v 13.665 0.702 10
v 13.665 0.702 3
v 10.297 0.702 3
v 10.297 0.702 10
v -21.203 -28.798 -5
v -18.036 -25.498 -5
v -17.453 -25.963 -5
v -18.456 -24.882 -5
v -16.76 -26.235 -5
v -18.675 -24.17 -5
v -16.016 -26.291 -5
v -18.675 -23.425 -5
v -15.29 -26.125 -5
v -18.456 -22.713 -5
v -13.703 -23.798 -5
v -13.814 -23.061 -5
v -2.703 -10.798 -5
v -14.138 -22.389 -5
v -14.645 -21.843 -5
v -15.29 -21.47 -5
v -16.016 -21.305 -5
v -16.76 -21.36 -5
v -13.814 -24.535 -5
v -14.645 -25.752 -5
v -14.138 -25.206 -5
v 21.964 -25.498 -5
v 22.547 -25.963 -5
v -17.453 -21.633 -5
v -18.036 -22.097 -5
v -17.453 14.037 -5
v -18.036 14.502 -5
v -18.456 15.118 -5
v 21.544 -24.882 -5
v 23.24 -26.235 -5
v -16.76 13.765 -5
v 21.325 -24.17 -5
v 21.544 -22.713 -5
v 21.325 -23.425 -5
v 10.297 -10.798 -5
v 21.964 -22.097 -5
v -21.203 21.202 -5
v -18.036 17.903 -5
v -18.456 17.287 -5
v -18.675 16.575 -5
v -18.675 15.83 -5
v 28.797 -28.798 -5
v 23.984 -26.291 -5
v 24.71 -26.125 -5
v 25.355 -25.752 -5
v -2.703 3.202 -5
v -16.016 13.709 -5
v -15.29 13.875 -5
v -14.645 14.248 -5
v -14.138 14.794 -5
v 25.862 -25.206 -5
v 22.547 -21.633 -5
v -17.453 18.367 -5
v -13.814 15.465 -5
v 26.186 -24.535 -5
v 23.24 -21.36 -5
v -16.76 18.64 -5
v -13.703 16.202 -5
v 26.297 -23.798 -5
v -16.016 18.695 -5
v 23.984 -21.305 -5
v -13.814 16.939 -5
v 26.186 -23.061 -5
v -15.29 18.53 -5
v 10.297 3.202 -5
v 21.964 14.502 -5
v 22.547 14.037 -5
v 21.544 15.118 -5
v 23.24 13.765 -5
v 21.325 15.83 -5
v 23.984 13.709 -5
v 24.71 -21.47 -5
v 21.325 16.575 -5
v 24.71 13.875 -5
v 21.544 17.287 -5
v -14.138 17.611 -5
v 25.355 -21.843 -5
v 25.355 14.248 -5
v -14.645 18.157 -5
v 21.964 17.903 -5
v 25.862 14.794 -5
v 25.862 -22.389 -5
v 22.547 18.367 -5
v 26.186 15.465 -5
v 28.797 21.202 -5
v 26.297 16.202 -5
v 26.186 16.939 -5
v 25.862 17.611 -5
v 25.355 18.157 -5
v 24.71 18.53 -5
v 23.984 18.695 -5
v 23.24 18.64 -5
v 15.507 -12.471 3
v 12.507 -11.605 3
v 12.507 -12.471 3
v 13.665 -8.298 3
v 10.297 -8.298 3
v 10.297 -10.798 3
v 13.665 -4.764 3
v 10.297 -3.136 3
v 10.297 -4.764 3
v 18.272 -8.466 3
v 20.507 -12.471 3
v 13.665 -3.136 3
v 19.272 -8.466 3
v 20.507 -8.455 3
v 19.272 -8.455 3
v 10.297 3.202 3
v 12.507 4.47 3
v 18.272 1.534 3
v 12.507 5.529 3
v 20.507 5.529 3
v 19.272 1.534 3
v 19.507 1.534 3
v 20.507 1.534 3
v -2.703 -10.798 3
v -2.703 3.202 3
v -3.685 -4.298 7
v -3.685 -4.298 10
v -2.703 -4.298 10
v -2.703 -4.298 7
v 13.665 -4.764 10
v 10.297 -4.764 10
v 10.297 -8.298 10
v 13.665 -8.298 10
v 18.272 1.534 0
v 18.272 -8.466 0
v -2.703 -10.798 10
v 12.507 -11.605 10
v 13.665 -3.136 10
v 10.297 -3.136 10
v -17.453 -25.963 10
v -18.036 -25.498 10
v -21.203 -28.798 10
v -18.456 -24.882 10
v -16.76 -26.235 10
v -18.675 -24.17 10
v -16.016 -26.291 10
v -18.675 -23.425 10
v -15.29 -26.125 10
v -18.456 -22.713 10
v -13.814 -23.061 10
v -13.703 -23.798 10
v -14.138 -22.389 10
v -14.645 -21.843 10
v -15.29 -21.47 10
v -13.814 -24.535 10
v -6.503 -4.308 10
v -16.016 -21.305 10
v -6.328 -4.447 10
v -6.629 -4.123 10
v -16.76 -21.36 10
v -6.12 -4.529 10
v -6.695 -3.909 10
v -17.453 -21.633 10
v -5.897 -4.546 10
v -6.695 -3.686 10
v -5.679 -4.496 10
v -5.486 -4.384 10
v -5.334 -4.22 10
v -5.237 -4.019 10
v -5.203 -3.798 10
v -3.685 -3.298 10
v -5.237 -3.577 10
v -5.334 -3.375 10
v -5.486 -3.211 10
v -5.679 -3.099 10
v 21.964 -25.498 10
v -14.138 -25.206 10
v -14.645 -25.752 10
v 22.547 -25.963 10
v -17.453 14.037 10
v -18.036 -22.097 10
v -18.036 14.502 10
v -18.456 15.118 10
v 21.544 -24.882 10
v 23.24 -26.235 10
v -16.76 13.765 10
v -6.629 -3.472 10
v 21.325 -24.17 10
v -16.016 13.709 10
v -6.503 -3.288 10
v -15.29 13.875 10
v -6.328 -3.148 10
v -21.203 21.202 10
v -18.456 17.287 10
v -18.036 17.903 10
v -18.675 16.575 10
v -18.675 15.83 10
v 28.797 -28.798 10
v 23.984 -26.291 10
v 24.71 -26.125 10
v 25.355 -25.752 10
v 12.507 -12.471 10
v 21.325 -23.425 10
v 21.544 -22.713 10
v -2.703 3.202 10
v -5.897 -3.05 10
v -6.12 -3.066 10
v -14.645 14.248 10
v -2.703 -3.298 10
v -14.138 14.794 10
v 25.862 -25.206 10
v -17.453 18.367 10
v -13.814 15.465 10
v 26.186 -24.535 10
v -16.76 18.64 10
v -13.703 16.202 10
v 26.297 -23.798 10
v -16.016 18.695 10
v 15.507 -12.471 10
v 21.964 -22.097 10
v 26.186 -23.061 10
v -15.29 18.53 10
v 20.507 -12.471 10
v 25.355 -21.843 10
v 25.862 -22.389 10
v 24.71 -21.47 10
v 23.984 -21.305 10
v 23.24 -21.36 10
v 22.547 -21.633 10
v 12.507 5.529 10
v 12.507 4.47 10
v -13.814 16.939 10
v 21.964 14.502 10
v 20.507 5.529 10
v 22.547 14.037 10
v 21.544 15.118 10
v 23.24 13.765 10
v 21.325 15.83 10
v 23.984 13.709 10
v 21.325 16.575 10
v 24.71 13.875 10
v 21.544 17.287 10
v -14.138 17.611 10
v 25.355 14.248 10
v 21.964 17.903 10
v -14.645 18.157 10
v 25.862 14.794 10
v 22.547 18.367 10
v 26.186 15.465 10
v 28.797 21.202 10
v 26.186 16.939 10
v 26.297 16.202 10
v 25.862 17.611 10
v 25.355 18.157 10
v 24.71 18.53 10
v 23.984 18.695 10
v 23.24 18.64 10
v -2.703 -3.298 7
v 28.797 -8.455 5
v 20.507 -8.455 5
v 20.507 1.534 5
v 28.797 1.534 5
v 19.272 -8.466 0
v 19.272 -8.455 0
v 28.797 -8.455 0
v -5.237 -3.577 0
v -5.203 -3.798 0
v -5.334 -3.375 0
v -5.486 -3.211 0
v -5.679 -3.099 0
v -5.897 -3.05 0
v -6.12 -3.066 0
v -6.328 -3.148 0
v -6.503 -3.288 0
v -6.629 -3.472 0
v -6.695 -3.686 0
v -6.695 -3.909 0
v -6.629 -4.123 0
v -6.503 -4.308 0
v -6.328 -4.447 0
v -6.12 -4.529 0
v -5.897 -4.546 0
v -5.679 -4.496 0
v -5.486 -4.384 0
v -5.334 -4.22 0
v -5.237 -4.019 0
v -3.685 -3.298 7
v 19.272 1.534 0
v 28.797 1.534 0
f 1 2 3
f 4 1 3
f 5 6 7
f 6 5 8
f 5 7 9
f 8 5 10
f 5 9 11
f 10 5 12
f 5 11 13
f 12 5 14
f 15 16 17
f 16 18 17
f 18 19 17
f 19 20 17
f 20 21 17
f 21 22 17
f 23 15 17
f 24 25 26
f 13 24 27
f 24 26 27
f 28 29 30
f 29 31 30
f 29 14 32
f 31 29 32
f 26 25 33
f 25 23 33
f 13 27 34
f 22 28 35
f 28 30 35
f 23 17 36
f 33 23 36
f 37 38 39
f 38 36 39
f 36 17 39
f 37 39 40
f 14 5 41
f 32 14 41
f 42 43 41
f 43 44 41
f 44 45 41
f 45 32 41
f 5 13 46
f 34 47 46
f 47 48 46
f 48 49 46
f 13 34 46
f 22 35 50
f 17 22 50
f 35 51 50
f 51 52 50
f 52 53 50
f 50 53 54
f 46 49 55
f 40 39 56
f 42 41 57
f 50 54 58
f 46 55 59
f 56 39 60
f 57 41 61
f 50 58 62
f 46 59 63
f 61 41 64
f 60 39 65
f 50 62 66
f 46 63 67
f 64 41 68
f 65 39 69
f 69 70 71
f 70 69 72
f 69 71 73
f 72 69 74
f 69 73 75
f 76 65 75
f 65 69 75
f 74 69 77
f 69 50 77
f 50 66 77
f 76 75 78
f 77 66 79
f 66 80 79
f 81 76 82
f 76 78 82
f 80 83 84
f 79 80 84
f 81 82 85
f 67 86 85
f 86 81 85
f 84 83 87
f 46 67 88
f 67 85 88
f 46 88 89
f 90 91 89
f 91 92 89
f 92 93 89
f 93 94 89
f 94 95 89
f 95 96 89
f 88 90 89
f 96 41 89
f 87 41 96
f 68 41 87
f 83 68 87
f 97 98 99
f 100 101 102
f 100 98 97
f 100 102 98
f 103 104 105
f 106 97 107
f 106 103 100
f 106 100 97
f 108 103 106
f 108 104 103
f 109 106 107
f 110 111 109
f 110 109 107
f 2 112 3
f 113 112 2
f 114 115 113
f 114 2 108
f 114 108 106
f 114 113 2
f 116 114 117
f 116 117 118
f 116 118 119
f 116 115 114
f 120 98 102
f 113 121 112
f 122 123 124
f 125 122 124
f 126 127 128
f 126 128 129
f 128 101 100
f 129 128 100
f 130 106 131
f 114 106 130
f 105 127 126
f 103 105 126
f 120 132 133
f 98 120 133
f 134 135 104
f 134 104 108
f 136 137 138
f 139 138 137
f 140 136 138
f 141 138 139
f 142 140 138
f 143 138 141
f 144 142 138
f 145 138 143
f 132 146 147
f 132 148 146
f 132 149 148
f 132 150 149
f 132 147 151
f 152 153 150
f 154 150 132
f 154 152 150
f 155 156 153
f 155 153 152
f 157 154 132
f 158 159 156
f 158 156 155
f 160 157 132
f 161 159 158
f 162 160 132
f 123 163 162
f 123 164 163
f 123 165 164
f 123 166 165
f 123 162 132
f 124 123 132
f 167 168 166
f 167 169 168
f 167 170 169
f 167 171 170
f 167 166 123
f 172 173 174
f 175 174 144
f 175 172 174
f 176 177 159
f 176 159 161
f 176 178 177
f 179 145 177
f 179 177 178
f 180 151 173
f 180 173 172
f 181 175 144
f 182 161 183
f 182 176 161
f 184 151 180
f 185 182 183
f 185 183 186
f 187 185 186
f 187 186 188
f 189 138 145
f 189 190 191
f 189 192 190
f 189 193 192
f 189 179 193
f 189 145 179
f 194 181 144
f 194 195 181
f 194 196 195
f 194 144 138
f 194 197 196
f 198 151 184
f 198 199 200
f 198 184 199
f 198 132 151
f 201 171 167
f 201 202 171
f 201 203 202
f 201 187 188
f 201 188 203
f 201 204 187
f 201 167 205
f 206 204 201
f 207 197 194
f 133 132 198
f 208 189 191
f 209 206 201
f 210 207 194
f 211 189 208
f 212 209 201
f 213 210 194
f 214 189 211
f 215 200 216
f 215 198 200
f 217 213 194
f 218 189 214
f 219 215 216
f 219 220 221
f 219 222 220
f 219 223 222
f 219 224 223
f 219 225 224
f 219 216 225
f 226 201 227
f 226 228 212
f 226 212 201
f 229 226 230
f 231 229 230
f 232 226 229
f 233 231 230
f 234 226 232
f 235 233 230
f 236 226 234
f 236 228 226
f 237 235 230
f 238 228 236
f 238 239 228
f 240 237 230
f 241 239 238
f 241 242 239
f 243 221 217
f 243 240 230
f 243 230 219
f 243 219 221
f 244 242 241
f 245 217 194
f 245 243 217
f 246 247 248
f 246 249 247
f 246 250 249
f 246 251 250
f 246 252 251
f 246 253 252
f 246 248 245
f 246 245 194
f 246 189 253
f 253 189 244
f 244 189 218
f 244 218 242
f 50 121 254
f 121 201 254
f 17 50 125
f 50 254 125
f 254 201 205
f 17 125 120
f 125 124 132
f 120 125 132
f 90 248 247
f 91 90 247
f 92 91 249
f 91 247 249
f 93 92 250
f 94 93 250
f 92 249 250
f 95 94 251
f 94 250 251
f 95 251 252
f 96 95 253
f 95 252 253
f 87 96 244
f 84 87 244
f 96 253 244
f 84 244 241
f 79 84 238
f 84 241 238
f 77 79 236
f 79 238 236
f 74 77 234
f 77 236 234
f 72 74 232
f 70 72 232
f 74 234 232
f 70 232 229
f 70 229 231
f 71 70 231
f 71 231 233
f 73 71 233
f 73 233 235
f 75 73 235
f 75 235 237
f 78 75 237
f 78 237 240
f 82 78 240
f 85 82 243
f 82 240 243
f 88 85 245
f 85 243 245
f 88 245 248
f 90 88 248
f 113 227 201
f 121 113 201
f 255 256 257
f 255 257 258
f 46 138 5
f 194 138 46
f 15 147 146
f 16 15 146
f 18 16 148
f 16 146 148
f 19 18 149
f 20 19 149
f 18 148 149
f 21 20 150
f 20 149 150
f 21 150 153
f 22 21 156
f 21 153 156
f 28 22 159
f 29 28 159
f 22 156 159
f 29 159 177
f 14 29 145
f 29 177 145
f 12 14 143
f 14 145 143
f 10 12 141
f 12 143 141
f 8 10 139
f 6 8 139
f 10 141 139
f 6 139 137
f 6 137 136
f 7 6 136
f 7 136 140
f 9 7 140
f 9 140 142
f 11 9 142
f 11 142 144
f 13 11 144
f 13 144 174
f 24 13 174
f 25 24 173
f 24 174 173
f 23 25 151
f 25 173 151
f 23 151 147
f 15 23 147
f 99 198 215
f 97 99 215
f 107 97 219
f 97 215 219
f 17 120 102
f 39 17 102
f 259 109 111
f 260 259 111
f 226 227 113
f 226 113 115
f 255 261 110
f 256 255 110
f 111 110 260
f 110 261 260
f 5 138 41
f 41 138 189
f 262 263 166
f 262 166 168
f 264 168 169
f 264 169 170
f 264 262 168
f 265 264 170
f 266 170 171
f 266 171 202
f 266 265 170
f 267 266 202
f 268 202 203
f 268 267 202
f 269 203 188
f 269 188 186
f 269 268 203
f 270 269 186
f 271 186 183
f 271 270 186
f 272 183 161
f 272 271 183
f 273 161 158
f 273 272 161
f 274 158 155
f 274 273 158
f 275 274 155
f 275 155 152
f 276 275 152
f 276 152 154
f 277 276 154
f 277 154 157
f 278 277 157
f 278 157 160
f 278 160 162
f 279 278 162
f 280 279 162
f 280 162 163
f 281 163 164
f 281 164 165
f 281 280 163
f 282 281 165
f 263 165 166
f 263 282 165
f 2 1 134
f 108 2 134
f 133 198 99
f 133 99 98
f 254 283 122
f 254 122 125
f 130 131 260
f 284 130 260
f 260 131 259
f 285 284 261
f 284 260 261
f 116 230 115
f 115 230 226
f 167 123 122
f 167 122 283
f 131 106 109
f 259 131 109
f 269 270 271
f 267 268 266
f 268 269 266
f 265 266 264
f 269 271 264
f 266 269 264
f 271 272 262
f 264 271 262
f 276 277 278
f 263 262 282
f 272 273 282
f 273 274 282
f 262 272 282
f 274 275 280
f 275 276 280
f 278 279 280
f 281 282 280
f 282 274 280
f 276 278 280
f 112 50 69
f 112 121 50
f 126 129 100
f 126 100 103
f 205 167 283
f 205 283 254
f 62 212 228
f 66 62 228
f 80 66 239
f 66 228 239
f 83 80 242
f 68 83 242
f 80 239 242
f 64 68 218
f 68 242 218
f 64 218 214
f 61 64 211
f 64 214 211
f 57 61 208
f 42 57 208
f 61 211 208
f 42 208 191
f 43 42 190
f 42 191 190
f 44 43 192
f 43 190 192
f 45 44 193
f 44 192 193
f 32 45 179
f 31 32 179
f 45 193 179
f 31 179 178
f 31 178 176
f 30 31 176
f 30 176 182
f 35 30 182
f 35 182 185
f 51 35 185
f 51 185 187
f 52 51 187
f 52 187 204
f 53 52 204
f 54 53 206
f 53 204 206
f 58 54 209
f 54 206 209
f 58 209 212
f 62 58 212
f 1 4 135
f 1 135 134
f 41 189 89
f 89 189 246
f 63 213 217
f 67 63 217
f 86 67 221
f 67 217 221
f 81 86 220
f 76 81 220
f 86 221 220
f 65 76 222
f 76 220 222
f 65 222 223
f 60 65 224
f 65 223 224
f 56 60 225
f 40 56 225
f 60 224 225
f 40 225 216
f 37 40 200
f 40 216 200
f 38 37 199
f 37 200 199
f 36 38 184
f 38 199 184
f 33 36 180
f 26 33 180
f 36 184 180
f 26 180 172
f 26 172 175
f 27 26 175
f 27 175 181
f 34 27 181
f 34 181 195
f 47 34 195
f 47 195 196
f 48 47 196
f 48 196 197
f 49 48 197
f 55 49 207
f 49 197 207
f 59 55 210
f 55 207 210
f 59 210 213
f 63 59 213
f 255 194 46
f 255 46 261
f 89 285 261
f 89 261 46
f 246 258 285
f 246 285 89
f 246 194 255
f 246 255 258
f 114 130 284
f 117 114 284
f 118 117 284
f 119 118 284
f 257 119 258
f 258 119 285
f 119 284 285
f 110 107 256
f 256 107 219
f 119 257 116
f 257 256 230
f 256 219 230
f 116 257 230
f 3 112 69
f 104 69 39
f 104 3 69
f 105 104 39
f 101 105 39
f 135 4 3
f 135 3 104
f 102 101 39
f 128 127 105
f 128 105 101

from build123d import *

# Parameters (mm, degrees)
F0_W           = 40
F0_H           = 40
F0_R           = 0.75
F0_W_2         = 13
F0_H_2         = 14
F1_DEPTH       = 10
F3_DEPTH       = 7
F5_DEPTH       = 7
F6_W           = 1
F6_H           = 10
F7_DEPTH       = 3
F9_W           = 40
F9_H           = 40
F9_W_2         = 13
F9_H_2         = 14
F10_DEPTH      = 5
F8_W           = 16.9138771733
F8_H           = 9.9888166223
F11_DEPTH      = 5
F13_W          = 3
F13_H          = 1.8063458446
F13_H_2        = 1.6774383839
F14_DEPTH      = 7
F15_W          = 50
F15_H          = 50
F15_W_2        = 40
F15_H_2        = 40
F16_DEPTH      = 10
F16_DEPTH_BACK = 5
F8_W_2         = 1
F8_W_3         = 4.5249774149
F8_W_4         = 11.3888997585
F18_DEPTH      = 5
F17_R          = 2.5
F19_DEPTH      = 15
F20_W          = 1
F20_H          = 18
F20_W_2        = 1.1054268107
F20_H_2        = 4.0429783403
F20_H_3        = 1.6282203142
F20_W_3        = 3.4427661449
F20_H_4        = 4.0144510567
F21_DEPTH      = 7
F22_W          = 1.9634229802
F22_H          = 1
F23_DEPTH      = 3


with BuildPart() as f1:
    # F0 (on Top) → F1 (new body)
    with BuildSketch(Plane.XY):
        with Locations((3.7967593362, -3.7976530202)):
            Rectangle(F0_W, F0_H)
        with Locations((-5.9532406638, -3.7976530202)):
            Circle(F0_R, mode=Mode.SUBTRACT)
        with Locations((3.7967593362, -3.7976530202)):
            Rectangle(F0_W_2, F0_H_2, mode=Mode.SUBTRACT)
    extrude(amount=F1_DEPTH)

    # F2 (on face) → F3 (cut)
    with BuildSketch(Plane.XY.offset(10)):
        Polygon((10.2967593362, -10.7976530202), (-2.7032406638, -10.7976530202), (19.3193775079, -11.9658830875), (19.2741411646, 5.0340567263), (-2.7032406638, 3.2023469798), (10.2967593362, 3.2023469798), (10.2967593362, -1.4381406363), (10.2967593362, -5.3588831797), align=None)
    extrude(amount=-F3_DEPTH, mode=Mode.SUBTRACT)

    # F4 (on face) → F5 (join)
    with BuildSketch(Plane.XY.offset(3)):
        Polygon((10.2967593362, -3.7976530202), (10.2967593362, -8.2976530202), (14.2967593362, -8.2976530202), (14.2967593362, 0.7023469798), (10.2967593362, 0.7023469798), align=None)
    extrude(amount=F5_DEPTH)

    # F6 (on face) → F7 (cut)
    with BuildSketch(Plane.XY.offset(3)):
        with Locations((18.7717819214, -3.4659131806)):
            Rectangle(F6_W, F6_H)
    extrude(amount=-F7_DEPTH, mode=Mode.SUBTRACT)

    # F9 (on face) → F10 (join)
    with BuildSketch(Plane(origin=(0, 0, 0), x_dir=(1, 0, 0), z_dir=(0, 0, -1))):
        with Locations((3.7967593362, 3.7976530202)):
            Rectangle(F9_W, F9_H)
        with Locations((3.7967593362, 3.7976530202)):
            Rectangle(F9_W_2, F9_H_2, mode=Mode.SUBTRACT)
    extrude(amount=F10_DEPTH)

    # F8 (on face) → F11 (cut)
    with BuildSketch(Plane(origin=(0, 0, 0), x_dir=(1, 0, 0), z_dir=(0, 0, -1))):
        with Locations((26.728720508, 3.4603214917)):
            Rectangle(F8_W, F8_H)
    extrude(amount=-F11_DEPTH, mode=Mode.SUBTRACT)

    # F13 (on face) → F14 (cut)
    with BuildSketch(Plane.XY.offset(10)):
        Polygon((19.5070204958, -12.4706726056), (19.5070204958, 5.5293273944), (15.5070204958, 5.5293273944), (15.5070204958, 3.7229815498), (15.5070204958, -10.7932342216), (15.5070204958, -12.4706726056), align=None)
        with Locations((14.0070204958, 4.6261544721)):
            Rectangle(F13_W, F13_H)
        with Locations((14.0070204958, -11.6319534136)):
            Rectangle(F13_W, F13_H_2)
    extrude(amount=-F14_DEPTH, mode=Mode.SUBTRACT)

    # F15 (on Top) → F16 (join, two sides)
    with BuildSketch(Plane.XY) as f16_sk:
        with Locations((3.7967593362, -3.7976530202)):
            Rectangle(F15_W, F15_H)
        with Locations((3.7967593362, -3.7976530202)):
            Rectangle(F15_W_2, F15_H_2, mode=Mode.SUBTRACT)
    extrude(amount=F16_DEPTH)
    extrude(f16_sk.sketch, amount=-F16_DEPTH_BACK)

    # F8 (on face) → F18 (cut)
    with BuildSketch(Plane(origin=(0, 0, 0), x_dir=(1, 0, 0), z_dir=(0, 0, -1))):
        with Locations((18.7717819214, 3.4603214917)):
            Rectangle(F8_W_2, F8_H)
        with Locations((21.5342706288, 3.4603214917)):
            Rectangle(F8_W_3, F8_H)
        with Locations((29.4912092155, 3.4603214917)):
            Rectangle(F8_W_4, F8_H)
    extrude(amount=-F18_DEPTH, mode=Mode.SUBTRACT)

    # F17 (on face) → F19 (cut)
    with BuildSketch(Plane.XY.offset(10)):
        with Locations((-16.2032406638, -23.7976530202)):
            Circle(F17_R)
        with Locations((-16.2032406638, 16.2023469798)):
            Circle(F17_R)
        with Locations((23.7967593362, -23.7976530202)):
            Circle(F17_R)
        with Locations((23.7967593362, 16.2023469798)):
            Circle(F17_R)
    extrude(amount=-F19_DEPTH, mode=Mode.SUBTRACT)

    # F20 (on face) → F21 (cut)
    with BuildSketch(Plane.XY.offset(10)):
        with Locations((20.0070204958, -3.4706726056)):
            Rectangle(F20_W, F20_H)
        with Locations((14.2178074457, -1.1141116556)):
            Rectangle(F20_W_2, F20_H_2)
        with Locations((14.2178074457, -3.9497109829)):
            Rectangle(F20_W_2, F20_H_3)
        with Locations((11.9437109679, -3.9497109829)):
            Rectangle(F20_W_3, F20_H_3)
        with Locations((14.2178074457, -6.7710466683)):
            Rectangle(F20_W_2, F20_H_4)
    extrude(amount=-F21_DEPTH, mode=Mode.SUBTRACT)

    # F22 (on face) → F23 (cut)
    with BuildSketch(Plane.XY.offset(10)):
        with Locations((-2.7032406638, -3.7976530202)):
            Rectangle(F22_W, F22_H)
    extrude(amount=-F23_DEPTH, mode=Mode.SUBTRACT)


solid = f1.part
